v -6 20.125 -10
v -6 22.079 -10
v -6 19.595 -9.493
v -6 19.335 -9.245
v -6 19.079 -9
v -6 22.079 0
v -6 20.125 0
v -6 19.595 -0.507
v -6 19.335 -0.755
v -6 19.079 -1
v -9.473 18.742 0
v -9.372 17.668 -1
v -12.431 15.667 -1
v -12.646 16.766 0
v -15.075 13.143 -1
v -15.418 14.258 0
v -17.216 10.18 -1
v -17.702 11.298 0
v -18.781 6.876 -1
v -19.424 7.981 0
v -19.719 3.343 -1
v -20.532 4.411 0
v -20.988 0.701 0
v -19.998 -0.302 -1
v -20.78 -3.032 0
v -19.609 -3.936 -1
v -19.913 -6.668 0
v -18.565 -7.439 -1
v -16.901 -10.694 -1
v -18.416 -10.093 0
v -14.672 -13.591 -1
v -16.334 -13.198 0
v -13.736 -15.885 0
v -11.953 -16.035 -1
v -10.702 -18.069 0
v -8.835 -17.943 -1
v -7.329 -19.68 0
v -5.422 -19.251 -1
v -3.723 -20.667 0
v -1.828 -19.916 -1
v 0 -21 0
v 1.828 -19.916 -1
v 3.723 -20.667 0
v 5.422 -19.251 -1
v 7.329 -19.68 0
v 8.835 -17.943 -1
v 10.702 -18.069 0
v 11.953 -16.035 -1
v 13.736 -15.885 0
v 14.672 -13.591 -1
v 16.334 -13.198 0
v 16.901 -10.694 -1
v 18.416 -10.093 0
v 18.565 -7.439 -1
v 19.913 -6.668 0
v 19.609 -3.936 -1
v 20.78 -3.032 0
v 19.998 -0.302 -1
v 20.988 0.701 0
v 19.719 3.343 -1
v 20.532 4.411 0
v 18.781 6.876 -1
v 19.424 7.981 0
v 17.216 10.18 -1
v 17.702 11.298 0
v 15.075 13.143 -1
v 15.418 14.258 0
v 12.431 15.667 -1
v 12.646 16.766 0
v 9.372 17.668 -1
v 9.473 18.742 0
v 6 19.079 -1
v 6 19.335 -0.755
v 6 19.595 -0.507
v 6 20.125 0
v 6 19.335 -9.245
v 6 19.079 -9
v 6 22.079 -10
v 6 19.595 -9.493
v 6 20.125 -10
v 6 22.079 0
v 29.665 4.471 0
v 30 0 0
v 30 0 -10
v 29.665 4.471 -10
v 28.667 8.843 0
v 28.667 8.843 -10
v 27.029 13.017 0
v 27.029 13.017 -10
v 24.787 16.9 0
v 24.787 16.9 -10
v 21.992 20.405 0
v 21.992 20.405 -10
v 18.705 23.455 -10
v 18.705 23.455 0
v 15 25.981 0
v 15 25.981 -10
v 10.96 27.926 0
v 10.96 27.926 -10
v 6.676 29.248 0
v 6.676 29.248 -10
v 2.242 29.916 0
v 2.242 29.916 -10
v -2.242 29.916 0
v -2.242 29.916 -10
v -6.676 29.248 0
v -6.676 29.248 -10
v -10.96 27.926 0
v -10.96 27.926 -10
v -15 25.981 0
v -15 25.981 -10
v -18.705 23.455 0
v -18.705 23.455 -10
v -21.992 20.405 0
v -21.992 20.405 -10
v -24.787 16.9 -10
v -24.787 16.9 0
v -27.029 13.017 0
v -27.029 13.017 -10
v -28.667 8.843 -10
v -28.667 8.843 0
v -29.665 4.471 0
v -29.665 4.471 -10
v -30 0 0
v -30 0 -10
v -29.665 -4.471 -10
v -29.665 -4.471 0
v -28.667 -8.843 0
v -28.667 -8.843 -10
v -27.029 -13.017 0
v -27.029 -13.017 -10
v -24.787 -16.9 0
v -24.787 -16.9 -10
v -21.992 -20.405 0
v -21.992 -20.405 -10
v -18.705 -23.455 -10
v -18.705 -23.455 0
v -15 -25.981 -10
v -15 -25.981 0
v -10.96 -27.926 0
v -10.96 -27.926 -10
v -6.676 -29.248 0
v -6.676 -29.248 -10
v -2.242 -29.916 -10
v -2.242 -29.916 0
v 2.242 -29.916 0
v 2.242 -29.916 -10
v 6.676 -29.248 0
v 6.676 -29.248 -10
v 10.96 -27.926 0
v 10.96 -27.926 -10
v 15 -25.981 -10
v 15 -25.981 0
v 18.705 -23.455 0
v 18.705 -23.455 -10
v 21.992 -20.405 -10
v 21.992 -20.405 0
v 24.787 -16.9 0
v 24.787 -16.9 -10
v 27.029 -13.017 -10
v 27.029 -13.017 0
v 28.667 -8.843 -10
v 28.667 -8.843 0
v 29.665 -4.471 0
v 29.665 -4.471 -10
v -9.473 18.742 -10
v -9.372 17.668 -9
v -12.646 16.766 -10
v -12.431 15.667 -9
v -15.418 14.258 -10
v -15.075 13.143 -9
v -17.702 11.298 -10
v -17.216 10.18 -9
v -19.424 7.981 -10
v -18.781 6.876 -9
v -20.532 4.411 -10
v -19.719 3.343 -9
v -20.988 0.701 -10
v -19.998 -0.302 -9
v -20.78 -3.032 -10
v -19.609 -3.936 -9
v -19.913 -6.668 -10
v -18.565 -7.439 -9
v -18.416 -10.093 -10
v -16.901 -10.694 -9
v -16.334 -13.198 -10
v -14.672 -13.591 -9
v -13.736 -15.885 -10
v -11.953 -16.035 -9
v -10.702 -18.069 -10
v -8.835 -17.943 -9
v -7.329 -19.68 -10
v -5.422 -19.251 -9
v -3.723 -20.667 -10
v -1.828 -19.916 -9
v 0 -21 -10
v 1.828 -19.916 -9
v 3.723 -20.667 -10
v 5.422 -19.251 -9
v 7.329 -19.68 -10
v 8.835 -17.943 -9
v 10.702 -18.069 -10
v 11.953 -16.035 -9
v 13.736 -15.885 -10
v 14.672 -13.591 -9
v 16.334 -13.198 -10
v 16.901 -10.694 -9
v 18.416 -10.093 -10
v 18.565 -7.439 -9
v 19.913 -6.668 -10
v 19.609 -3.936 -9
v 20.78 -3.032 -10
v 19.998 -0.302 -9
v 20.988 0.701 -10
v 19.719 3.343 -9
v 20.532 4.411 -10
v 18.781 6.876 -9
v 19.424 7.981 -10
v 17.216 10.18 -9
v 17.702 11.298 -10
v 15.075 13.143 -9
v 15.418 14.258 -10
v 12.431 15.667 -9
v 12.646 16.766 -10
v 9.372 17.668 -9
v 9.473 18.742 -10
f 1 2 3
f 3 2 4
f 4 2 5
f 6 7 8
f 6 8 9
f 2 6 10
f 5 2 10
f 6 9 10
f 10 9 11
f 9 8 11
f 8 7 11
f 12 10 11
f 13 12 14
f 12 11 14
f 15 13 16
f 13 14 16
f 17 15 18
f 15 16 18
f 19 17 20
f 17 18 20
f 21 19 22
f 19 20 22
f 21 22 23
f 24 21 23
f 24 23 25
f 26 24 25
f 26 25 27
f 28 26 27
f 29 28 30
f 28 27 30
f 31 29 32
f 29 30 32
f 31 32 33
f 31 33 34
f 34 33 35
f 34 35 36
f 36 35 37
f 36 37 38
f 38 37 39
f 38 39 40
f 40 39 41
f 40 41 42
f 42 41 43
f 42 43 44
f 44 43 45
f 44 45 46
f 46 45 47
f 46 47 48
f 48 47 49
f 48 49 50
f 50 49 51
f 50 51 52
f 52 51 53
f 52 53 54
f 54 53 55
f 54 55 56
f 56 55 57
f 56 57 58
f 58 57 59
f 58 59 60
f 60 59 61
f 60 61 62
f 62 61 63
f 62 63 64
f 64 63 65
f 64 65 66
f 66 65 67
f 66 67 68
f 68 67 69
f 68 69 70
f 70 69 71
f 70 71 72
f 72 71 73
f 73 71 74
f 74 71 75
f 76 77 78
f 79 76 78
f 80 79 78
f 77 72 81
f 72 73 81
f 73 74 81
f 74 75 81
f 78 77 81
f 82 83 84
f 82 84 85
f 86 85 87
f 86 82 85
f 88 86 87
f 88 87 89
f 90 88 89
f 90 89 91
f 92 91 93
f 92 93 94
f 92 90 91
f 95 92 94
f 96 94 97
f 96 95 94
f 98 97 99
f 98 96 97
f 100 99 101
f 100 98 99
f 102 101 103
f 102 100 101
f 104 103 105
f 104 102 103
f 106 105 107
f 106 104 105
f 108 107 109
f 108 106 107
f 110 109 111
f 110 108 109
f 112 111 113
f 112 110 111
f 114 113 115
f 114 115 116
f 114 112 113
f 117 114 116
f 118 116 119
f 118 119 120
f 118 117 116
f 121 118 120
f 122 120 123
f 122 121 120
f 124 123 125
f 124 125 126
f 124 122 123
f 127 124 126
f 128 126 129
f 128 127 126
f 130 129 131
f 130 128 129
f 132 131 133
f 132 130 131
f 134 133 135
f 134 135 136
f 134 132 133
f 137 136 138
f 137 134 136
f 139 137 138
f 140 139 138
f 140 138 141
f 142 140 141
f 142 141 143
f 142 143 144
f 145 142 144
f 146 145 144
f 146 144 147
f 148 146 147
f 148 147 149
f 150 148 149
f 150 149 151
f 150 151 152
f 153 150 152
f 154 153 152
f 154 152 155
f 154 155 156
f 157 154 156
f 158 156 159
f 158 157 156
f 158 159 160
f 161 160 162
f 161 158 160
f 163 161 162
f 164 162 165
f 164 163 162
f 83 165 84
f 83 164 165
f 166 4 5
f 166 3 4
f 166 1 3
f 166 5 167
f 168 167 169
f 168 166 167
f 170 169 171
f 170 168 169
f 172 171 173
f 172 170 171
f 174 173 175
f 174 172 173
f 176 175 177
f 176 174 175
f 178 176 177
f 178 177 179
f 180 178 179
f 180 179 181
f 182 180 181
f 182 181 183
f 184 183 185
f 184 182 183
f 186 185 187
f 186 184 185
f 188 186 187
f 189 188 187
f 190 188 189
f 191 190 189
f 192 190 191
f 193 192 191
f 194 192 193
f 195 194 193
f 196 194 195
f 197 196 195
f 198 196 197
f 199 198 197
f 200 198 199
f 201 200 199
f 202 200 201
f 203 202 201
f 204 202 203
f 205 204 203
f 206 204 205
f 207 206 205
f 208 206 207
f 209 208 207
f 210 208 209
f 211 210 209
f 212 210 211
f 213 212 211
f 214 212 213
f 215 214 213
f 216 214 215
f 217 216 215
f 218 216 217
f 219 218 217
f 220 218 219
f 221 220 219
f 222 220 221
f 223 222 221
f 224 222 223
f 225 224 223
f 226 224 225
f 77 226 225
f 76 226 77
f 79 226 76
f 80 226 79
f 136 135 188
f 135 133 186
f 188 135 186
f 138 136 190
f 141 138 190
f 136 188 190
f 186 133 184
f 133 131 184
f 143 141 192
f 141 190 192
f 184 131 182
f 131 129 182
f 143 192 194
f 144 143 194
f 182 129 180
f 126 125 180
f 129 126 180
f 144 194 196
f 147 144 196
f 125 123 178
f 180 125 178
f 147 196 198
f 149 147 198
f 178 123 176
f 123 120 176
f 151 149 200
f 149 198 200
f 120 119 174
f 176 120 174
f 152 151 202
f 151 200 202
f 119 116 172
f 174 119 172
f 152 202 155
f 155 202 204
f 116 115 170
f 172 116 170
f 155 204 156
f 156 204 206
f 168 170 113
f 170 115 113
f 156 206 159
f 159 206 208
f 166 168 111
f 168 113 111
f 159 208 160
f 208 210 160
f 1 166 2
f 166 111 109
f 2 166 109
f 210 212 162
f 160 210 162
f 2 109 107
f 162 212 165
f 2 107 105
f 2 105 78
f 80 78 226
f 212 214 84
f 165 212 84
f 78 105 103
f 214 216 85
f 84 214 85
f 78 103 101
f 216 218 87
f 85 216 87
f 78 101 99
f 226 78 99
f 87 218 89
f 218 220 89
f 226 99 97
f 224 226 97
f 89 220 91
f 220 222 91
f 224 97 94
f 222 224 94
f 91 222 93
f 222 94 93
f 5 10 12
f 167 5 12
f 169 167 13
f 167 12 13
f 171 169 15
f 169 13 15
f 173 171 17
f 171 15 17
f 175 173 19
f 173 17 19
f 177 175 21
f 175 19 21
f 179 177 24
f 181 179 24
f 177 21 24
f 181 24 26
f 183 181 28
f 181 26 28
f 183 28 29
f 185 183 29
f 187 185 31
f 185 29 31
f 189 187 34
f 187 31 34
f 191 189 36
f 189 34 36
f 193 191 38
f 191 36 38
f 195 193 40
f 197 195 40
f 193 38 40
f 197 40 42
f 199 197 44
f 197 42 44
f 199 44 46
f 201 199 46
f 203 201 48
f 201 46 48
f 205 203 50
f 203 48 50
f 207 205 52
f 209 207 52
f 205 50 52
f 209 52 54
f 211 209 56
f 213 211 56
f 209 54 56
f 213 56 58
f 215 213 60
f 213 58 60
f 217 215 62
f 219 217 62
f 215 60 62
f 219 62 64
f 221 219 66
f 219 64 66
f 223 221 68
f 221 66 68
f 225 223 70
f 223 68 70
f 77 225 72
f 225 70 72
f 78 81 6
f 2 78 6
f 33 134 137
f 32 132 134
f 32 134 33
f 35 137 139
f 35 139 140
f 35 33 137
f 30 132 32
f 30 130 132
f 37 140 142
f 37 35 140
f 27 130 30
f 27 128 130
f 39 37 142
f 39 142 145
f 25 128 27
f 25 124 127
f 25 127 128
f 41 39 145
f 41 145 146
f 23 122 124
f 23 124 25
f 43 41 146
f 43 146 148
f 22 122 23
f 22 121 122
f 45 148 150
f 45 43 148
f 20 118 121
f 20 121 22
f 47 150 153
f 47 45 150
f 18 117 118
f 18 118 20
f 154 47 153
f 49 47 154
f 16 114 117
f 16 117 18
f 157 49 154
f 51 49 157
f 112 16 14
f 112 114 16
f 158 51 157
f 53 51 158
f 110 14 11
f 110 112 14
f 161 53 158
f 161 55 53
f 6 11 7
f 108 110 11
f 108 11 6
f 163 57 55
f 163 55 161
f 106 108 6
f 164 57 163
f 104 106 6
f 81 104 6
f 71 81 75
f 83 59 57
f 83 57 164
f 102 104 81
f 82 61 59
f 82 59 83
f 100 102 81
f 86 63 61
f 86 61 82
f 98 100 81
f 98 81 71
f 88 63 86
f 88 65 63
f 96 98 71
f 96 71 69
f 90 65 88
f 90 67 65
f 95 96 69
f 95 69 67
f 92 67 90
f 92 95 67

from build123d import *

# Parameters (mm, degrees)
SKETCH1_R           = 30
BOSS_EXTRUDE1_DEPTH = 10
CHAMFER1_SIZE       = 1


with BuildPart() as part:
    # Sketch1 → Boss-Extrude1 (new body)
    with BuildSketch(Plane.XY):
        Circle(SKETCH1_R)
        with BuildLine():
            ThreePointArc((-6, 19.078784028), (0, -20), (6, 19.078784028))
            Line((6, 19.078784028), (6, 22.078784028))
            Line((6, 22.078784028), (-6, 22.078784028))
            Line((-6, 22.078784028), (-6, 19.078784028))
        make_face(mode=Mode.SUBTRACT)
    extrude(amount=-BOSS_EXTRUDE1_DEPTH)

    # Chamfer1
    chamfer1_edges = [part.edges().sort_by_distance(p)[0] for p in [
        (0, -20, -10),
        (0, -20, 0),
    ]]
    chamfer(chamfer1_edges, length=CHAMFER1_SIZE)


solid = part.part
